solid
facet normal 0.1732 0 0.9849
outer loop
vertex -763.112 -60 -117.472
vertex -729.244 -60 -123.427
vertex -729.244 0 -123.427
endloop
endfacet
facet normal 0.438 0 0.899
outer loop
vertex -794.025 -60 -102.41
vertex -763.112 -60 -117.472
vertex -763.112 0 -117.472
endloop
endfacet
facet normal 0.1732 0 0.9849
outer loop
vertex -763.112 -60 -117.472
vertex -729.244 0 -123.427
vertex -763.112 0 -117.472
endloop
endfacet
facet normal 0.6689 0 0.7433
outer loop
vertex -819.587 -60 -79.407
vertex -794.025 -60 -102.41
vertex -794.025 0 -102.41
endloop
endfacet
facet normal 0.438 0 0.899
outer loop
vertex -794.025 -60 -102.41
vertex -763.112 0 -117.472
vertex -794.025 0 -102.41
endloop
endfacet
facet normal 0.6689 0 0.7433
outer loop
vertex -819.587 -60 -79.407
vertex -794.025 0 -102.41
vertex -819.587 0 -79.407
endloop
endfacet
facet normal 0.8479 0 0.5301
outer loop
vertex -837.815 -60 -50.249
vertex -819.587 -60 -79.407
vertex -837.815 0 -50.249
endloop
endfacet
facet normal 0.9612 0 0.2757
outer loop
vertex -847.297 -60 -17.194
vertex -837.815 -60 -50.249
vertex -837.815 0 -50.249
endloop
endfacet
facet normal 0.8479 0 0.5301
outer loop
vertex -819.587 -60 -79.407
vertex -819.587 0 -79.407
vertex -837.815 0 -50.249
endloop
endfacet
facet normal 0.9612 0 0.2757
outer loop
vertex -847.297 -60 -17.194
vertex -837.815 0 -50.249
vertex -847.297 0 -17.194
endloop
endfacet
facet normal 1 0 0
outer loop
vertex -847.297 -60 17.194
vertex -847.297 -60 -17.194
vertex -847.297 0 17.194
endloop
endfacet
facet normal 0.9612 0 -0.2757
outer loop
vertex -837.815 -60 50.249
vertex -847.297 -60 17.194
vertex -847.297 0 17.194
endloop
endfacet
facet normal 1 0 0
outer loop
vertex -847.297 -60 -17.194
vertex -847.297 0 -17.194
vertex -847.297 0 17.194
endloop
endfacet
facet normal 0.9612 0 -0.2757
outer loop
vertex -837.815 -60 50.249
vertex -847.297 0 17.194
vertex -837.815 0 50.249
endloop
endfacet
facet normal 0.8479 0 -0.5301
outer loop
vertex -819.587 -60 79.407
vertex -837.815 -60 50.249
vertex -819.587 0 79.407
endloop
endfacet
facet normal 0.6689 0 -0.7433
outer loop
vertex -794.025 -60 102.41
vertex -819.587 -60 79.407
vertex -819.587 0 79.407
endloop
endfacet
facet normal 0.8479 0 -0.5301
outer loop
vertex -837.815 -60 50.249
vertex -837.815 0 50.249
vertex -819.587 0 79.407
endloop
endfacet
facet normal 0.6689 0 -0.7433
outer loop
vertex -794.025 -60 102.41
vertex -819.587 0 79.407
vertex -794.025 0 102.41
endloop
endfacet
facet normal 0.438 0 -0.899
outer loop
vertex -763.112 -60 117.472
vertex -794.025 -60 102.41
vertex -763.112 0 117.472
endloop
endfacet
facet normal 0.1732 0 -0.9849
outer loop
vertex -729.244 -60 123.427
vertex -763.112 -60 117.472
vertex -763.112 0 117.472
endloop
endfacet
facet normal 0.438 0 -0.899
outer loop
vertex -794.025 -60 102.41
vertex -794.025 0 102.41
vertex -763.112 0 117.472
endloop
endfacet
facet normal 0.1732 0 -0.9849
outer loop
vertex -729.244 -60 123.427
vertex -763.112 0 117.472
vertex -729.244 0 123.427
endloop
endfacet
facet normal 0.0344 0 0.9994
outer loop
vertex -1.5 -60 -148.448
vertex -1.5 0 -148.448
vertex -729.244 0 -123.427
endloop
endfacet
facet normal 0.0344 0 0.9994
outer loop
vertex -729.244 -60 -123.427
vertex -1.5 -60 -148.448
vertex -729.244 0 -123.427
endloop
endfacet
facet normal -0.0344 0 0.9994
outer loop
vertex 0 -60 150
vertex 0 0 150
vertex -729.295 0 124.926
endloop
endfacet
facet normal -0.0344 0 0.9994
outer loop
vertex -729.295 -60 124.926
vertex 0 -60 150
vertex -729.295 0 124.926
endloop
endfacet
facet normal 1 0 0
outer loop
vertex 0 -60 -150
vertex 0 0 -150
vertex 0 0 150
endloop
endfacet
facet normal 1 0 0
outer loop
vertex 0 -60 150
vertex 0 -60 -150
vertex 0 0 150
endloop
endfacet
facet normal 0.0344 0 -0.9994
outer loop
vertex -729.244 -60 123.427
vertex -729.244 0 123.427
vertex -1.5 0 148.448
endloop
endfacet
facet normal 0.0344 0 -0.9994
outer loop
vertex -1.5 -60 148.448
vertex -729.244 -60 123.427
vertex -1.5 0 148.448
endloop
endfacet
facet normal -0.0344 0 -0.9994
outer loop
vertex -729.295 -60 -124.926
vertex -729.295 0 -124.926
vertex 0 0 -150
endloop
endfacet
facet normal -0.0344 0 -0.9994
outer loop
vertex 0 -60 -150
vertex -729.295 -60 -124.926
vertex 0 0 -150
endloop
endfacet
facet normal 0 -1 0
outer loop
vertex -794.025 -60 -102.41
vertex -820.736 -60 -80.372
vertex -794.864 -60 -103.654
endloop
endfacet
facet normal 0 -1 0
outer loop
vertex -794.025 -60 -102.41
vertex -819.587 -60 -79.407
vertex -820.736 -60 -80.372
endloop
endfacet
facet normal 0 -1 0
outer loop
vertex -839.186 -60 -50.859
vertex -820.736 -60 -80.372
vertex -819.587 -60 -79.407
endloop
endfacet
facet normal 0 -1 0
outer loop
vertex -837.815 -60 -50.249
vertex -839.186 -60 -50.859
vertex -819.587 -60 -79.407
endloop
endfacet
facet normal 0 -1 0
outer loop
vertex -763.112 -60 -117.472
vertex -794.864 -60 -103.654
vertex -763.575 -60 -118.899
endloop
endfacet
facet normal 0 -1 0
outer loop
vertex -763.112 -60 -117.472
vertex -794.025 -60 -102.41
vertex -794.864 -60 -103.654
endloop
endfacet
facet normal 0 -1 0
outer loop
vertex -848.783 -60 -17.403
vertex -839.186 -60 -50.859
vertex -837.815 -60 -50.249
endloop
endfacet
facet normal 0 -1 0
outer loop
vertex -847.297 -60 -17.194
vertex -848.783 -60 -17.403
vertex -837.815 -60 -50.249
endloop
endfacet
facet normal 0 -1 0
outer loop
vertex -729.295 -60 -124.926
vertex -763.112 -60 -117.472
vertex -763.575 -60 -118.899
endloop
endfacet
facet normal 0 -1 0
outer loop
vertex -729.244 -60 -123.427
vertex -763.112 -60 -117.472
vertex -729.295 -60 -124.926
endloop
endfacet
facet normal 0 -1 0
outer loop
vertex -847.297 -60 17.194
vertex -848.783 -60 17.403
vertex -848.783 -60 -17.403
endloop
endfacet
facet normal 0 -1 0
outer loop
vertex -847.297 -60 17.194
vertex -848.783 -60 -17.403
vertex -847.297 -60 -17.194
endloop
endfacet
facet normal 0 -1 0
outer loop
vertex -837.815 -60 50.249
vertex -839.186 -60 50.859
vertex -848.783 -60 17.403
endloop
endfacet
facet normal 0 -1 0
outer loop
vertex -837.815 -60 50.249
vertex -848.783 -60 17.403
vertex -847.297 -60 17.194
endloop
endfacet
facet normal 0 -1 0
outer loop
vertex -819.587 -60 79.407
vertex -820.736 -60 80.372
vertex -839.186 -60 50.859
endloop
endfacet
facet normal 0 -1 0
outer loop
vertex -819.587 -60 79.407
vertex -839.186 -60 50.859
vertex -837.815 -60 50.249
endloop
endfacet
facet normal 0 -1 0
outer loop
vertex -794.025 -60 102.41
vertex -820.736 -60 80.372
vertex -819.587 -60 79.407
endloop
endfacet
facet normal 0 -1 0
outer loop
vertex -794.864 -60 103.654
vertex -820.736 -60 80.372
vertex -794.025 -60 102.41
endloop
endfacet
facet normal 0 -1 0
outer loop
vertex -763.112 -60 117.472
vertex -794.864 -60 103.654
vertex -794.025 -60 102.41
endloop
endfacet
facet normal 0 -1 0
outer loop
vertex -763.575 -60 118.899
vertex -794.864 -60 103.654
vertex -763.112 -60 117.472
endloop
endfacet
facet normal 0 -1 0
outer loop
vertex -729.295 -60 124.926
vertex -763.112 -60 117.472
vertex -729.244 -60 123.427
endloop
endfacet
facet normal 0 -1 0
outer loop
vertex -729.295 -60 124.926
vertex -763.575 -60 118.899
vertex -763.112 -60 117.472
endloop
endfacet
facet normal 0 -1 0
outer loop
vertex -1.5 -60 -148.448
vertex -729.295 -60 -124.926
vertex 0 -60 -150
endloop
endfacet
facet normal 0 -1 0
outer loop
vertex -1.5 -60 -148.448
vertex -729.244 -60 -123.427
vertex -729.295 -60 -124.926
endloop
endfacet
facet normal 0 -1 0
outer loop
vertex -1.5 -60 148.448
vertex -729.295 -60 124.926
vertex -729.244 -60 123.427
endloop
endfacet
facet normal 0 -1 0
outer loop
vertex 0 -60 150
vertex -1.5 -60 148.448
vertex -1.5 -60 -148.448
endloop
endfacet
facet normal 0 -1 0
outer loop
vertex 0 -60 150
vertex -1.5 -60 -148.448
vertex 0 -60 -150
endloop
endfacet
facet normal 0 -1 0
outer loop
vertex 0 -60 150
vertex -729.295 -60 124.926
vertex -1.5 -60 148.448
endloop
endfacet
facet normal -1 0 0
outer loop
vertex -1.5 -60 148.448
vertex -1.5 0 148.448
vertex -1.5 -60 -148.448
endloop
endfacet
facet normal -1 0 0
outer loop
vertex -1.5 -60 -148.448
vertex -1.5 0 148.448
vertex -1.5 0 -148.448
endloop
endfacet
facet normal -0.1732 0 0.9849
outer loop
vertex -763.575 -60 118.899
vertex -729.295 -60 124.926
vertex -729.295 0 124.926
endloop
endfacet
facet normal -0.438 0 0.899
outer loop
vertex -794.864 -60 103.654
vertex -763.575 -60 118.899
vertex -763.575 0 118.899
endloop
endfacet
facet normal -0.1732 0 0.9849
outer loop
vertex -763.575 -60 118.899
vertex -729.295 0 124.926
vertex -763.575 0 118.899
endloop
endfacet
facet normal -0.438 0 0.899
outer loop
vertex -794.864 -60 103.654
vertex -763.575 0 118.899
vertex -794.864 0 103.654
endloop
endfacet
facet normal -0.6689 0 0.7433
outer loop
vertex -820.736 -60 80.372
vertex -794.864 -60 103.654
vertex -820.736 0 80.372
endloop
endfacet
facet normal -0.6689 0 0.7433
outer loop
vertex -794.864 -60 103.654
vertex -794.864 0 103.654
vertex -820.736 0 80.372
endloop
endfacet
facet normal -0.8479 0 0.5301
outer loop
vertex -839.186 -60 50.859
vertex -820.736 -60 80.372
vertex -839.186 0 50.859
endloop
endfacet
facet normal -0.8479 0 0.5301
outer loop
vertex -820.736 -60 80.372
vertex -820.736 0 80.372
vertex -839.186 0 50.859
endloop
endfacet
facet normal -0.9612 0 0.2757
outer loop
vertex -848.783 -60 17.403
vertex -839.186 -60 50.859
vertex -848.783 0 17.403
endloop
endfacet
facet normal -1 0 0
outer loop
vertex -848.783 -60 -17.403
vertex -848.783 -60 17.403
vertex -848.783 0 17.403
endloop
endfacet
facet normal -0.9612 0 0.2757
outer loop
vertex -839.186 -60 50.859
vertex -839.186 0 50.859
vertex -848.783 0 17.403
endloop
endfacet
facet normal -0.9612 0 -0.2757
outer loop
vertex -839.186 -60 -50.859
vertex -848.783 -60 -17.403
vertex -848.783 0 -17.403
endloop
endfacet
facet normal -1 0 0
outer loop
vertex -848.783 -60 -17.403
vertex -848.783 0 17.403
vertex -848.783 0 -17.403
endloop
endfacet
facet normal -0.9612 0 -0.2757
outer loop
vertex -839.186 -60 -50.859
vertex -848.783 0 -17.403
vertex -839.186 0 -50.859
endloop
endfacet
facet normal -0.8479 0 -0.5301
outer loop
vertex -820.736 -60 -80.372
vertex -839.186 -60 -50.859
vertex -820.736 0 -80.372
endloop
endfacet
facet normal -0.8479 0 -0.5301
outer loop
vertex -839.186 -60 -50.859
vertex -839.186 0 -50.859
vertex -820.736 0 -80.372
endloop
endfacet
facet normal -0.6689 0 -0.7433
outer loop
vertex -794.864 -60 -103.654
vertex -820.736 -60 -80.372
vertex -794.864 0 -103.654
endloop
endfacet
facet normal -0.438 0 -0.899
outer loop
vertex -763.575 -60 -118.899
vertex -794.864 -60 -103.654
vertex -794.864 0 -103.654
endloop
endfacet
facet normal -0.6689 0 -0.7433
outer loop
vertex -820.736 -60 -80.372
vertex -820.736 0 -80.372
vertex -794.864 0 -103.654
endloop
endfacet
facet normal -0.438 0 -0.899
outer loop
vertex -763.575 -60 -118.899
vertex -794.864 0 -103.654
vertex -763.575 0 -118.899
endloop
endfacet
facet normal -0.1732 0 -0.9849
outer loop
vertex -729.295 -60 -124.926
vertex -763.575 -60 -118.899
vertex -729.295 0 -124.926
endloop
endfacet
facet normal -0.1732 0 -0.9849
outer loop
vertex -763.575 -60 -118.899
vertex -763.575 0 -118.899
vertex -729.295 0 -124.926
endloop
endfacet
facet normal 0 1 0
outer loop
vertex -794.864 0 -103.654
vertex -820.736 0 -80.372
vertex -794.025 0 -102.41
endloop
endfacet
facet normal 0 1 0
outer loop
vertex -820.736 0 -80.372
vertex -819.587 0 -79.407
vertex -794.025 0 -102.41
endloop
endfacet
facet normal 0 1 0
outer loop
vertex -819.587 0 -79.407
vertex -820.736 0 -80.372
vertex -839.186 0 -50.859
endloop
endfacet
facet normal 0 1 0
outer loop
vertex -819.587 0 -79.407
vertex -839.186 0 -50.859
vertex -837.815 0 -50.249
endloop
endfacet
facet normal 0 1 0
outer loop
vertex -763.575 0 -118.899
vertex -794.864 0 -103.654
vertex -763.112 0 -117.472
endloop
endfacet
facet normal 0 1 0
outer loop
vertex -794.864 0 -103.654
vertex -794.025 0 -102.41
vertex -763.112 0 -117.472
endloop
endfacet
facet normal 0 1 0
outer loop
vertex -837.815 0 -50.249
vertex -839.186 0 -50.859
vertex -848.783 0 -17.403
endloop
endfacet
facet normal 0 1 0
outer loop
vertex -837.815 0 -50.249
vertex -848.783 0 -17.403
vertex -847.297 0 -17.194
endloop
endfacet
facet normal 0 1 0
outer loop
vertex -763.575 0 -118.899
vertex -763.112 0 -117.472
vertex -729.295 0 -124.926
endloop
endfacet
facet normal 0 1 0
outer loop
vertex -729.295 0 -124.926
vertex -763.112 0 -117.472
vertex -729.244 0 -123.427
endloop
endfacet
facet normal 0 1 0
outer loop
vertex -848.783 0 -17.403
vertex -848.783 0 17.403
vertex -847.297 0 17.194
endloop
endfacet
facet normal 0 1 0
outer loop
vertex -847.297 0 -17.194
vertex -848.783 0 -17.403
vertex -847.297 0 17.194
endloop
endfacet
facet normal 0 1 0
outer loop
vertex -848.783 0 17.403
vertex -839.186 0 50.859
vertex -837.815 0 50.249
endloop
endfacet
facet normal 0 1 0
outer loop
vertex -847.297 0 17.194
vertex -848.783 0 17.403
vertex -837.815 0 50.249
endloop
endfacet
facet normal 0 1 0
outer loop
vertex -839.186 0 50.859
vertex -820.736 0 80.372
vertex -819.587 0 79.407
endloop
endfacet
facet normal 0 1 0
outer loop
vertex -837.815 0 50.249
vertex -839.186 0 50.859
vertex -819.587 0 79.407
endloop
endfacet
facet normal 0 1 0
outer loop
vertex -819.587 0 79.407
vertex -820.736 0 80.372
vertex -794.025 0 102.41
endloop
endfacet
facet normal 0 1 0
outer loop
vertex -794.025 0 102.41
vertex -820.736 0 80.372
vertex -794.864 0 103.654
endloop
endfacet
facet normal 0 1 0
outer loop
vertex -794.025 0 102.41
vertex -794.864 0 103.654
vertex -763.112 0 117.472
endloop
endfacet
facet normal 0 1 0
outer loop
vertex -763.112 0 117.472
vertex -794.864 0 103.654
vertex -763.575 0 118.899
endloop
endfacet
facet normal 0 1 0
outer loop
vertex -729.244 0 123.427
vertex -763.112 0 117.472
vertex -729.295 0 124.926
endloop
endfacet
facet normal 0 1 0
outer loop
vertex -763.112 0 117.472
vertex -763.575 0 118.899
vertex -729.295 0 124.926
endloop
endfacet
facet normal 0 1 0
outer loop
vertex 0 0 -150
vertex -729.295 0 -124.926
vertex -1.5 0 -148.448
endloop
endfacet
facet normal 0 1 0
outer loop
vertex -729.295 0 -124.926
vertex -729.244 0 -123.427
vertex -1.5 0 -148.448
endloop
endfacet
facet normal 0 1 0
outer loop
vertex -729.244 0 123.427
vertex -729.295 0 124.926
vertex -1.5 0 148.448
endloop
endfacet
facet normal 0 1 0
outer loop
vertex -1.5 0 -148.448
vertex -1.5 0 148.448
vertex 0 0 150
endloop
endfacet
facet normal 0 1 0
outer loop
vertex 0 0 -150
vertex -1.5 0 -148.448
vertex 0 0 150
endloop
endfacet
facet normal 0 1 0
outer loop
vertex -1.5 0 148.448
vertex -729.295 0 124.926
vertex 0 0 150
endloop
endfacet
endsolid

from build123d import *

# Parameters (mm, degrees)
F1_DEPTH = 60


with BuildPart() as f1:
    # F0 (on Front) → F1 (new body)
    with BuildSketch(Plane.XZ):
        with BuildLine():
            Line((0, -150), (0, 0))
            Line((0, 0), (0, 150))
            Line((0, 150), (-729.295073, 124.926188))
            ThreePointArc((-729.295073, 124.926188), (-850, 0), (-729.295073, -124.926188))
            Line((-729.295073, -124.926188), (0, -150))
        make_face()
        with BuildLine():
            Line((-1.5, 148.447542), (-1.5, 0))
            Line((-1.5, 0), (-1.5, -148.447542))
            Line((-1.5, -148.447542), (-729.243532, -123.427073))
            ThreePointArc((-729.243532, -123.427073), (-848.5, 0), (-729.243532, 123.427073))
            Line((-729.243532, 123.427073), (-1.5, 148.447542))
        make_face(mode=Mode.SUBTRACT)
    extrude(amount=F1_DEPTH)


solid = f1.part
